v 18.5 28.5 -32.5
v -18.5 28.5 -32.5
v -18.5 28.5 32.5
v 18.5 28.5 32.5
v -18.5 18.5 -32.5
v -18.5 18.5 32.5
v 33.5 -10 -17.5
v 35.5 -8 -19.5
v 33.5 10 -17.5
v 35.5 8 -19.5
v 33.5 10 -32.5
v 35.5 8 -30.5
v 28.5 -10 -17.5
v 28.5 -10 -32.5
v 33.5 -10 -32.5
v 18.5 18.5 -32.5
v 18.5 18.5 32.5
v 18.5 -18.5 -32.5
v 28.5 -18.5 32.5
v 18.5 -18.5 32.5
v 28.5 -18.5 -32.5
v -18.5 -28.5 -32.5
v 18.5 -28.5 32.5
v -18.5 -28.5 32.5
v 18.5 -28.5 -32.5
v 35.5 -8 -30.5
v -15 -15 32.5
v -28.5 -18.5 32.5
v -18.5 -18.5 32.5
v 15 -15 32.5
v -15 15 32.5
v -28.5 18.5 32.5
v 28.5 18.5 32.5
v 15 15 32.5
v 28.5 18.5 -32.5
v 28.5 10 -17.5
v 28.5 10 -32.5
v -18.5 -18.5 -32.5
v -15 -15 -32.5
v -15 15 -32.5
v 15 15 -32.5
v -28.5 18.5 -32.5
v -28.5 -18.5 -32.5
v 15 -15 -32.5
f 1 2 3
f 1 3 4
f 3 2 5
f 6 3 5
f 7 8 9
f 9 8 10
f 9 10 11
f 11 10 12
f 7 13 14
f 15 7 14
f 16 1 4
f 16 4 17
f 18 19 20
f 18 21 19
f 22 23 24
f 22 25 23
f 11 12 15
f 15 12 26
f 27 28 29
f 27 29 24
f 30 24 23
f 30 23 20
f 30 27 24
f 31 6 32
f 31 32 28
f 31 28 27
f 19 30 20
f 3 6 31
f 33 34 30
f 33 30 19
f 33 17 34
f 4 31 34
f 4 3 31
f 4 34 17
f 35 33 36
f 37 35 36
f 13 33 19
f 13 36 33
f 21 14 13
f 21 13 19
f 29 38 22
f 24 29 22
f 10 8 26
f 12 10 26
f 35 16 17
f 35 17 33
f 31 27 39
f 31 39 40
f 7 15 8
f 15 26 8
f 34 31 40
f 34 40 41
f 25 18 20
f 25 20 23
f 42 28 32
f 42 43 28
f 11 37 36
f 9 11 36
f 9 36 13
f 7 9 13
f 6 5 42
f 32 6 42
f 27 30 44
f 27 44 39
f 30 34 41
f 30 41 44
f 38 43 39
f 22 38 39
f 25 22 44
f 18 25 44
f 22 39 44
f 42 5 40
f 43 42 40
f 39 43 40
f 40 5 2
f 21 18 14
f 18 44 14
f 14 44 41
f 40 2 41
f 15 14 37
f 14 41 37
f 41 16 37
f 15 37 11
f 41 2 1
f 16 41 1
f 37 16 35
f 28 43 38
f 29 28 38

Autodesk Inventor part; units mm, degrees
ref_plane "YZ Plane" through (0, 0, 0) normal (1, 0, 0) x (0, 1, 0)
ref_plane "XZ Plane" through (0, 0, 0) normal (0, 1, 0) x (-1, 0, 0)
ref_plane "XY Plane" through (0, 0, 0) normal (0, 0, 1) x (1, 0, 0)
sketch "Sketch1" plane through (0, 0, 0) normal (0, 0, 1) x (1, 0, 0)
  line L0 (-28.5, 28.5) -> (28.5, 28.5)
  line L1 (28.5, 28.5) -> (28.5, -28.5)
  line L2 (28.5, -28.5) -> (-28.5, -28.5)
  line L3 (-28.5, -28.5) -> (-28.5, 28.5)
  line L4 (-15, 15) -> (15, 15)
  line L5 (15, 15) -> (15, -15)
  line L6 (15, -15) -> (-15, -15)
  line L7 (-15, -15) -> (-15, 15)
  line L8 (-18.5, 28.5) -> (-18.5, 18.5)
  line L9 (-18.5, 18.5) -> (-28.5, 18.5)
  line L10 (18.5, 28.5) -> (18.5, 18.5)
  line L11 (18.5, 18.5) -> (28.5, 18.5)
  line L12 (28.5, -18.5) -> (18.5, -18.5)
  line L13 (18.5, -18.5) -> (18.5, -28.5)
  line L14 (-28.5, -18.5) -> (-18.5, -18.5)
  line L15 (-18.5, -18.5) -> (-18.5, -28.5)
  line L16 (-18.5, 28.5) -> (18.5, 28.5)
  line L17 (28.5, 18.5) -> (28.5, -18.5)
  line L18 (18.5, -28.5) -> (-18.5, -28.5)
  line L19 (-28.5, -18.5) -> (-28.5, 18.5)
  point P0 (0, 0)
  dimension "d0" = 28.5
  dimension "d1" = 28.5
  dimension "d2" = 57
  dimension "d3" = 57
  dimension "d4" = 30
  dimension "d5" = 30
  dimension "d6" = 15
  dimension "d7" = 15
  dimension "d8" = 10
  dimension "d9" = 10
  dimension "d10" = 10
  dimension "d11" = 10
  dimension "d12" = 10
  dimension "d13" = 10
  dimension "d14" = 10
extrude "Extrusion1" add sketch "Sketch1" along normal mid plane 65 contours L0 L10 L11 L1 L12 L13 L2 L15 L14 L3 L9 L8
sketch "Sketch2" plane through (28.5, -18.5, 32.5) normal (1, 0, 0) x (0, 0, -1)
  line L0 (65, 33.5) -> (65, 3.5) projected
  line L1 (65, 18.5) -> (65, 28.5)
  line L2 (65, 28.5) -> (50, 28.5)
  line L3 (50, 28.5) -> (50, 8.5)
  line L4 (50, 8.5) -> (65, 8.5)
  point P0 (32.5, 18.5)
  dimension "d17" = 10
  dimension "d20" = 15
  dimension "d22" = 20
extrude "Extrusion2" add sketch "Sketch2" along normal blind 7
chamfer "Chamfer1" distance 2 angle 45 4 edges at (35.5, 10, -25) (35.5, 0, -32.5) (35.5, -10, -25) (35.5, 0, -17.5)
properties part number "MotorBody"
